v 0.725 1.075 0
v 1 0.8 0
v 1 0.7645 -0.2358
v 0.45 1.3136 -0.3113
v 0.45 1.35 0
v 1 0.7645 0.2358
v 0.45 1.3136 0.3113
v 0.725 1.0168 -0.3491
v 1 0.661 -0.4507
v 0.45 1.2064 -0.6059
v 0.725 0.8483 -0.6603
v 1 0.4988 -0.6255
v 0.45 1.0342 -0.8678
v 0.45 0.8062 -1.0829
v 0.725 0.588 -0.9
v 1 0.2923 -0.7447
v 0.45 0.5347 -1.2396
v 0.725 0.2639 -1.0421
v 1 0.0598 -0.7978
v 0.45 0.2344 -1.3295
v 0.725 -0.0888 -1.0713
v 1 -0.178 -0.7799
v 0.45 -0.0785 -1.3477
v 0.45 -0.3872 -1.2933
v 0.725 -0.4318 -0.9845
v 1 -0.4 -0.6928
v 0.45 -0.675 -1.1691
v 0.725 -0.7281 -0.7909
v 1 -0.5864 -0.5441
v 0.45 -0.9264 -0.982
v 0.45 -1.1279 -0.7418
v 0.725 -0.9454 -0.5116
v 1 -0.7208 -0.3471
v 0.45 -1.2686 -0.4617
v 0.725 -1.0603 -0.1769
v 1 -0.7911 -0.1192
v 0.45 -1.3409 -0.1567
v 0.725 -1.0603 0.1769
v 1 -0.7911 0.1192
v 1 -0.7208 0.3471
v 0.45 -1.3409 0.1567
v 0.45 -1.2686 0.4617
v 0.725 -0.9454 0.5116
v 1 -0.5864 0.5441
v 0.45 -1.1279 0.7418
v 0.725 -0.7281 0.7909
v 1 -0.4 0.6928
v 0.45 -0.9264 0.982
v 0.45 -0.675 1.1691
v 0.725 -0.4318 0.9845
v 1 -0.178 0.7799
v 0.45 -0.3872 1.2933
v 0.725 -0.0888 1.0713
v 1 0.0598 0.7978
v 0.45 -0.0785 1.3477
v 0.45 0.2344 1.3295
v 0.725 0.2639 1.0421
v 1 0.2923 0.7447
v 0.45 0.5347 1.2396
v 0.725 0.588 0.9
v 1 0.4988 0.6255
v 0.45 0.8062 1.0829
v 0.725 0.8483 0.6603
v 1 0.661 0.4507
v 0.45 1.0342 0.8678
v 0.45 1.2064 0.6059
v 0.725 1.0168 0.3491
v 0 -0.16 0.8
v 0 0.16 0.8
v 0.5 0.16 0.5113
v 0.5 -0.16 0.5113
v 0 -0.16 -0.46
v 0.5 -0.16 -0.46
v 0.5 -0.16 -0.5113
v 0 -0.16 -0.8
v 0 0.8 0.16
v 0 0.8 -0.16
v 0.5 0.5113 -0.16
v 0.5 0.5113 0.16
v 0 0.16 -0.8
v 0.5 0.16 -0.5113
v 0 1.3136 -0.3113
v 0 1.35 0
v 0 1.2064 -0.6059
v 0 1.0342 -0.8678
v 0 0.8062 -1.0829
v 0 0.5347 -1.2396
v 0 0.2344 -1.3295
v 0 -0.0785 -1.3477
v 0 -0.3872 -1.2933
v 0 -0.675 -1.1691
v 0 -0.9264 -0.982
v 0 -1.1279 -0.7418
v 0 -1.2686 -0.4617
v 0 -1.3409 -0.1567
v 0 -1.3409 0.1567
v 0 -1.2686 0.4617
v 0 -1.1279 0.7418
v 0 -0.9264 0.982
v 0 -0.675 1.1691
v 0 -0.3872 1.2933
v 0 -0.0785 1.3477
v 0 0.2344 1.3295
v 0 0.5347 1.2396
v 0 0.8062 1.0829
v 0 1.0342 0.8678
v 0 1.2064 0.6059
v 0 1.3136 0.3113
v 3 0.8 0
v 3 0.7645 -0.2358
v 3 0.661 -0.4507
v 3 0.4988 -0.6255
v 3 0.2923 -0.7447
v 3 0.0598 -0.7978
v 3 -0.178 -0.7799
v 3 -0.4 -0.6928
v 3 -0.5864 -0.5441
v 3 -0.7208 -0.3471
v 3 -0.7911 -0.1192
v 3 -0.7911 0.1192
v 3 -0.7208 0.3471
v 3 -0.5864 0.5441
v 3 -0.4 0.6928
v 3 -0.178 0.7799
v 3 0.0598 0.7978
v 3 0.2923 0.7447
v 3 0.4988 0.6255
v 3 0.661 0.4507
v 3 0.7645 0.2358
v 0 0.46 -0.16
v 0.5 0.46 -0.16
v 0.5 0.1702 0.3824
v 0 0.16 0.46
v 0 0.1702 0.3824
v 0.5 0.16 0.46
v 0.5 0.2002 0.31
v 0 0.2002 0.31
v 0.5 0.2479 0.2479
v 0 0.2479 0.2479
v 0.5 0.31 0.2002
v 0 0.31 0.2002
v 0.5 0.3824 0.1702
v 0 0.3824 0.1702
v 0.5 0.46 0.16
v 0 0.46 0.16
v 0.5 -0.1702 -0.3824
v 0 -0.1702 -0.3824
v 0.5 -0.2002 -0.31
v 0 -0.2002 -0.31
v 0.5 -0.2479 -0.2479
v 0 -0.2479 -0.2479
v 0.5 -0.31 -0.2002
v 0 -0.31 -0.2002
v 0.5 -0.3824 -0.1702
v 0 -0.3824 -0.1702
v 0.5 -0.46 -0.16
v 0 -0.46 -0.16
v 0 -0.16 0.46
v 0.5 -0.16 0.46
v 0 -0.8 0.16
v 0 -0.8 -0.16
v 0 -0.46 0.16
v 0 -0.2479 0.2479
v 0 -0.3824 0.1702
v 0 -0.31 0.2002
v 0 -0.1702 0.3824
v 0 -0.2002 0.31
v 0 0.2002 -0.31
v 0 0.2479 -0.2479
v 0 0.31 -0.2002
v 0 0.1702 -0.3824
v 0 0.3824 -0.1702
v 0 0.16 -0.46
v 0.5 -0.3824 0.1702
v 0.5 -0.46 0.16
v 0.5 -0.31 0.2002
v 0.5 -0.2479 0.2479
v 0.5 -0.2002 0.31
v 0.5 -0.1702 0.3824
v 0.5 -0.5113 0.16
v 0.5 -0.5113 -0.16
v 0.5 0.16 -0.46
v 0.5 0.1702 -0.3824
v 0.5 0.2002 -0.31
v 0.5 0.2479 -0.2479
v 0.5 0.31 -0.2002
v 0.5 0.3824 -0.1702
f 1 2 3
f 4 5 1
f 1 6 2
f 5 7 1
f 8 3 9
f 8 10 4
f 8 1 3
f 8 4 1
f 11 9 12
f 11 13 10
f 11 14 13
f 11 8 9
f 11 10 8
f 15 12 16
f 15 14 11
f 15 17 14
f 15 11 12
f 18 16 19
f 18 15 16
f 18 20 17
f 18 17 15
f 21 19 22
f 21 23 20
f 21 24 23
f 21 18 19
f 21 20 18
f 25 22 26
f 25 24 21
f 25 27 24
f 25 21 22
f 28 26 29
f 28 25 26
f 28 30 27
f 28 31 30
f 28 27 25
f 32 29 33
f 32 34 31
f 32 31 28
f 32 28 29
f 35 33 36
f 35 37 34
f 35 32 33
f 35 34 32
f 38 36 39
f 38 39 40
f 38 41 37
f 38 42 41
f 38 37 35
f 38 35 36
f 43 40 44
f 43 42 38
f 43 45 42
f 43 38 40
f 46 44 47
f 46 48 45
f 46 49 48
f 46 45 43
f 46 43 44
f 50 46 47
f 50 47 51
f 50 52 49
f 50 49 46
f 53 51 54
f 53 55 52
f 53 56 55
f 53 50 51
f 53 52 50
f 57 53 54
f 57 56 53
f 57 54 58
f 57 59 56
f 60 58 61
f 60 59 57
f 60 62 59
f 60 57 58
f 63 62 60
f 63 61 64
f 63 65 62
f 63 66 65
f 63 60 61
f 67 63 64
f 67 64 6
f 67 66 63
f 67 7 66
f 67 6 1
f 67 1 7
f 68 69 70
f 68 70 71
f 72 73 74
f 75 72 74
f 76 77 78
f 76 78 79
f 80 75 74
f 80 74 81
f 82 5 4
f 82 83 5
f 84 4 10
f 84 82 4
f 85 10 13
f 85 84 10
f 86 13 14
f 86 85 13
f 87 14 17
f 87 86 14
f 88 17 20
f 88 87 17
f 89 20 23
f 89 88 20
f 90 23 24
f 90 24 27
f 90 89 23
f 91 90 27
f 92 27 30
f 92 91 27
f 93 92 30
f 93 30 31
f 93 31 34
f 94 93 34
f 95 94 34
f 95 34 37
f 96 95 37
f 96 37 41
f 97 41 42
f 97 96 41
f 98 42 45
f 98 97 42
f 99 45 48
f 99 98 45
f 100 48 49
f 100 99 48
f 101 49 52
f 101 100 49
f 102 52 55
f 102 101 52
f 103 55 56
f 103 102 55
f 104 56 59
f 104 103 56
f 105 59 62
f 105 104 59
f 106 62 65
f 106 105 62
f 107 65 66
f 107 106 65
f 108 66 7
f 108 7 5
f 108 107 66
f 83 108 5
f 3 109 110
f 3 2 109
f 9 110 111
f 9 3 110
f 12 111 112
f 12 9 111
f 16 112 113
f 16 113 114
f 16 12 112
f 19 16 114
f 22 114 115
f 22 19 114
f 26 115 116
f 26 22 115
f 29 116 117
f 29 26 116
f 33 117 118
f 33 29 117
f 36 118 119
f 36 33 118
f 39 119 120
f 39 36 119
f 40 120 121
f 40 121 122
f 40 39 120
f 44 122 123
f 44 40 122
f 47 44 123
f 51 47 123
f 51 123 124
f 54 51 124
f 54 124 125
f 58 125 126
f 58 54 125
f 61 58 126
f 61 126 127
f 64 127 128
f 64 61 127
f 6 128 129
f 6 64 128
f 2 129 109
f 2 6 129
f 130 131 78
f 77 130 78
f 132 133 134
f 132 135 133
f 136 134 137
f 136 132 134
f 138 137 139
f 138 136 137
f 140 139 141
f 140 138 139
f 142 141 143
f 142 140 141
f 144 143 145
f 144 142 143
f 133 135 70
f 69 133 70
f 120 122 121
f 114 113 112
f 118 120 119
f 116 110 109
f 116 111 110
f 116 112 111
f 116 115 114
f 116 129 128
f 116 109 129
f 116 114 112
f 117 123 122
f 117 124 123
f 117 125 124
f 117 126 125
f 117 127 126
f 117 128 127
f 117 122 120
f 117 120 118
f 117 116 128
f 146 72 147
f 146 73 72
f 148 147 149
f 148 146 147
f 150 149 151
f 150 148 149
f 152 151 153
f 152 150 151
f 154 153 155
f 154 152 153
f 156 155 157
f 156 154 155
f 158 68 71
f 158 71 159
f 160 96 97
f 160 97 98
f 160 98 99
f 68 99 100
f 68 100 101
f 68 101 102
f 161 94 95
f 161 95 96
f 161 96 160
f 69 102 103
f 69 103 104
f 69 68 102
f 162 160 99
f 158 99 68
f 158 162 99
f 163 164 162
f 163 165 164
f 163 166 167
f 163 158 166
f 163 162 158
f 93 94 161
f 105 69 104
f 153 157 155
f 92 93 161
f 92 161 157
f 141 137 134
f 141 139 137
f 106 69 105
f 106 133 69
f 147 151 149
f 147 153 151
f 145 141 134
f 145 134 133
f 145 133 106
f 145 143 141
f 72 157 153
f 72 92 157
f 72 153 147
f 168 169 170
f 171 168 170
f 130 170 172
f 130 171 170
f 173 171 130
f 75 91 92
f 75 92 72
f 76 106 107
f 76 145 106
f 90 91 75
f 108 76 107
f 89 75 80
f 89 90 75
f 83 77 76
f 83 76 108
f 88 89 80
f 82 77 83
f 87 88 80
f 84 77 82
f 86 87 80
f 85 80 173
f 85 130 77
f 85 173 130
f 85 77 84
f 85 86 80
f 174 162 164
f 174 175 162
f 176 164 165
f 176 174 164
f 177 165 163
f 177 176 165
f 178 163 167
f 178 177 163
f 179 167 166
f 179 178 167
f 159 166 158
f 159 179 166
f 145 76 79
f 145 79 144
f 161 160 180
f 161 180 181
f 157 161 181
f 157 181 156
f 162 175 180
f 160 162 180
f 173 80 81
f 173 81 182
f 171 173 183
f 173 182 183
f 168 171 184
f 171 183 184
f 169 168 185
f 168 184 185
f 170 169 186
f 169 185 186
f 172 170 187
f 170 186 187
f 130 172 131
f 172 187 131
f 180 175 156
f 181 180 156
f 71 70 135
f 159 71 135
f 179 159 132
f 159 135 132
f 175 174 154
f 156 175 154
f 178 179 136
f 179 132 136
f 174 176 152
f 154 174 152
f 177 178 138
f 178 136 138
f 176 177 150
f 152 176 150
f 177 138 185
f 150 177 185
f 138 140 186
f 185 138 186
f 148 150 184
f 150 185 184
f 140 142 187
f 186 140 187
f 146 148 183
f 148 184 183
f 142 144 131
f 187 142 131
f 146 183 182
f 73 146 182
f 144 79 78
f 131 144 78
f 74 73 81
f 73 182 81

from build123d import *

# Parameters (mm, degrees)
CROSSRECESS_DEPTH = 0.5
DRAFT9_ANGLE      = 30
FILLET5_R         = 0.3


with BuildPart() as part:
    # Sketch1 → Base (revolve)
    with BuildSketch(Plane.XY):
        Polygon((3, 0.8), (1.7, 0.8), (1, 0.8), (0.45, 1.35), (0, 1.35), (0, 0), (3, 0), align=None)
    revolve(axis=Axis((4.515812911, 0, 0), (-1, 0, 0)))

    # Sketch6 → CrossRecess (cut)
    with BuildSketch(Plane(origin=(0, 0, 0), x_dir=(0, 0, -1), z_dir=(1, 0, 0))):
        Polygon((0.16, 0.16), (0.16, 0.8), (-0.16, 0.8), (-0.16, 0.16), (-0.8, 0.16), (-0.8, -0.16), (-0.16, -0.16), (-0.16, -0.8), (0.16, -0.8), (0.16, -0.16), (0.8, -0.16), (0.8, 0.16), align=None)
    extrude(amount=CROSSRECESS_DEPTH, mode=Mode.SUBTRACT)

    # Draft9
    draft9_faces = [part.faces().sort_by_distance(p)[0] for p in [
        (0.25, 0.8, 0),
        (0.25, 0, 0.8),
        (0.25, -0.8, 0),
        (0.25, 0, -0.8),
    ]]
    draft(draft9_faces, Plane(origin=(0, 1.35, 0), x_dir=(0, 0, -1), z_dir=(-1, 0, 0)), DRAFT9_ANGLE)

    # Fillet5
    fillet5_edges = [part.edges().sort_by_distance(p)[0] for p in [
        (0.25, 0.16, 0.16),
        (0.25, -0.16, 0.16),
        (0.25, -0.16, -0.16),
        (0.25, 0.16, -0.16),
    ]]
    fillet(fillet5_edges, radius=FILLET5_R)


solid = part.part
